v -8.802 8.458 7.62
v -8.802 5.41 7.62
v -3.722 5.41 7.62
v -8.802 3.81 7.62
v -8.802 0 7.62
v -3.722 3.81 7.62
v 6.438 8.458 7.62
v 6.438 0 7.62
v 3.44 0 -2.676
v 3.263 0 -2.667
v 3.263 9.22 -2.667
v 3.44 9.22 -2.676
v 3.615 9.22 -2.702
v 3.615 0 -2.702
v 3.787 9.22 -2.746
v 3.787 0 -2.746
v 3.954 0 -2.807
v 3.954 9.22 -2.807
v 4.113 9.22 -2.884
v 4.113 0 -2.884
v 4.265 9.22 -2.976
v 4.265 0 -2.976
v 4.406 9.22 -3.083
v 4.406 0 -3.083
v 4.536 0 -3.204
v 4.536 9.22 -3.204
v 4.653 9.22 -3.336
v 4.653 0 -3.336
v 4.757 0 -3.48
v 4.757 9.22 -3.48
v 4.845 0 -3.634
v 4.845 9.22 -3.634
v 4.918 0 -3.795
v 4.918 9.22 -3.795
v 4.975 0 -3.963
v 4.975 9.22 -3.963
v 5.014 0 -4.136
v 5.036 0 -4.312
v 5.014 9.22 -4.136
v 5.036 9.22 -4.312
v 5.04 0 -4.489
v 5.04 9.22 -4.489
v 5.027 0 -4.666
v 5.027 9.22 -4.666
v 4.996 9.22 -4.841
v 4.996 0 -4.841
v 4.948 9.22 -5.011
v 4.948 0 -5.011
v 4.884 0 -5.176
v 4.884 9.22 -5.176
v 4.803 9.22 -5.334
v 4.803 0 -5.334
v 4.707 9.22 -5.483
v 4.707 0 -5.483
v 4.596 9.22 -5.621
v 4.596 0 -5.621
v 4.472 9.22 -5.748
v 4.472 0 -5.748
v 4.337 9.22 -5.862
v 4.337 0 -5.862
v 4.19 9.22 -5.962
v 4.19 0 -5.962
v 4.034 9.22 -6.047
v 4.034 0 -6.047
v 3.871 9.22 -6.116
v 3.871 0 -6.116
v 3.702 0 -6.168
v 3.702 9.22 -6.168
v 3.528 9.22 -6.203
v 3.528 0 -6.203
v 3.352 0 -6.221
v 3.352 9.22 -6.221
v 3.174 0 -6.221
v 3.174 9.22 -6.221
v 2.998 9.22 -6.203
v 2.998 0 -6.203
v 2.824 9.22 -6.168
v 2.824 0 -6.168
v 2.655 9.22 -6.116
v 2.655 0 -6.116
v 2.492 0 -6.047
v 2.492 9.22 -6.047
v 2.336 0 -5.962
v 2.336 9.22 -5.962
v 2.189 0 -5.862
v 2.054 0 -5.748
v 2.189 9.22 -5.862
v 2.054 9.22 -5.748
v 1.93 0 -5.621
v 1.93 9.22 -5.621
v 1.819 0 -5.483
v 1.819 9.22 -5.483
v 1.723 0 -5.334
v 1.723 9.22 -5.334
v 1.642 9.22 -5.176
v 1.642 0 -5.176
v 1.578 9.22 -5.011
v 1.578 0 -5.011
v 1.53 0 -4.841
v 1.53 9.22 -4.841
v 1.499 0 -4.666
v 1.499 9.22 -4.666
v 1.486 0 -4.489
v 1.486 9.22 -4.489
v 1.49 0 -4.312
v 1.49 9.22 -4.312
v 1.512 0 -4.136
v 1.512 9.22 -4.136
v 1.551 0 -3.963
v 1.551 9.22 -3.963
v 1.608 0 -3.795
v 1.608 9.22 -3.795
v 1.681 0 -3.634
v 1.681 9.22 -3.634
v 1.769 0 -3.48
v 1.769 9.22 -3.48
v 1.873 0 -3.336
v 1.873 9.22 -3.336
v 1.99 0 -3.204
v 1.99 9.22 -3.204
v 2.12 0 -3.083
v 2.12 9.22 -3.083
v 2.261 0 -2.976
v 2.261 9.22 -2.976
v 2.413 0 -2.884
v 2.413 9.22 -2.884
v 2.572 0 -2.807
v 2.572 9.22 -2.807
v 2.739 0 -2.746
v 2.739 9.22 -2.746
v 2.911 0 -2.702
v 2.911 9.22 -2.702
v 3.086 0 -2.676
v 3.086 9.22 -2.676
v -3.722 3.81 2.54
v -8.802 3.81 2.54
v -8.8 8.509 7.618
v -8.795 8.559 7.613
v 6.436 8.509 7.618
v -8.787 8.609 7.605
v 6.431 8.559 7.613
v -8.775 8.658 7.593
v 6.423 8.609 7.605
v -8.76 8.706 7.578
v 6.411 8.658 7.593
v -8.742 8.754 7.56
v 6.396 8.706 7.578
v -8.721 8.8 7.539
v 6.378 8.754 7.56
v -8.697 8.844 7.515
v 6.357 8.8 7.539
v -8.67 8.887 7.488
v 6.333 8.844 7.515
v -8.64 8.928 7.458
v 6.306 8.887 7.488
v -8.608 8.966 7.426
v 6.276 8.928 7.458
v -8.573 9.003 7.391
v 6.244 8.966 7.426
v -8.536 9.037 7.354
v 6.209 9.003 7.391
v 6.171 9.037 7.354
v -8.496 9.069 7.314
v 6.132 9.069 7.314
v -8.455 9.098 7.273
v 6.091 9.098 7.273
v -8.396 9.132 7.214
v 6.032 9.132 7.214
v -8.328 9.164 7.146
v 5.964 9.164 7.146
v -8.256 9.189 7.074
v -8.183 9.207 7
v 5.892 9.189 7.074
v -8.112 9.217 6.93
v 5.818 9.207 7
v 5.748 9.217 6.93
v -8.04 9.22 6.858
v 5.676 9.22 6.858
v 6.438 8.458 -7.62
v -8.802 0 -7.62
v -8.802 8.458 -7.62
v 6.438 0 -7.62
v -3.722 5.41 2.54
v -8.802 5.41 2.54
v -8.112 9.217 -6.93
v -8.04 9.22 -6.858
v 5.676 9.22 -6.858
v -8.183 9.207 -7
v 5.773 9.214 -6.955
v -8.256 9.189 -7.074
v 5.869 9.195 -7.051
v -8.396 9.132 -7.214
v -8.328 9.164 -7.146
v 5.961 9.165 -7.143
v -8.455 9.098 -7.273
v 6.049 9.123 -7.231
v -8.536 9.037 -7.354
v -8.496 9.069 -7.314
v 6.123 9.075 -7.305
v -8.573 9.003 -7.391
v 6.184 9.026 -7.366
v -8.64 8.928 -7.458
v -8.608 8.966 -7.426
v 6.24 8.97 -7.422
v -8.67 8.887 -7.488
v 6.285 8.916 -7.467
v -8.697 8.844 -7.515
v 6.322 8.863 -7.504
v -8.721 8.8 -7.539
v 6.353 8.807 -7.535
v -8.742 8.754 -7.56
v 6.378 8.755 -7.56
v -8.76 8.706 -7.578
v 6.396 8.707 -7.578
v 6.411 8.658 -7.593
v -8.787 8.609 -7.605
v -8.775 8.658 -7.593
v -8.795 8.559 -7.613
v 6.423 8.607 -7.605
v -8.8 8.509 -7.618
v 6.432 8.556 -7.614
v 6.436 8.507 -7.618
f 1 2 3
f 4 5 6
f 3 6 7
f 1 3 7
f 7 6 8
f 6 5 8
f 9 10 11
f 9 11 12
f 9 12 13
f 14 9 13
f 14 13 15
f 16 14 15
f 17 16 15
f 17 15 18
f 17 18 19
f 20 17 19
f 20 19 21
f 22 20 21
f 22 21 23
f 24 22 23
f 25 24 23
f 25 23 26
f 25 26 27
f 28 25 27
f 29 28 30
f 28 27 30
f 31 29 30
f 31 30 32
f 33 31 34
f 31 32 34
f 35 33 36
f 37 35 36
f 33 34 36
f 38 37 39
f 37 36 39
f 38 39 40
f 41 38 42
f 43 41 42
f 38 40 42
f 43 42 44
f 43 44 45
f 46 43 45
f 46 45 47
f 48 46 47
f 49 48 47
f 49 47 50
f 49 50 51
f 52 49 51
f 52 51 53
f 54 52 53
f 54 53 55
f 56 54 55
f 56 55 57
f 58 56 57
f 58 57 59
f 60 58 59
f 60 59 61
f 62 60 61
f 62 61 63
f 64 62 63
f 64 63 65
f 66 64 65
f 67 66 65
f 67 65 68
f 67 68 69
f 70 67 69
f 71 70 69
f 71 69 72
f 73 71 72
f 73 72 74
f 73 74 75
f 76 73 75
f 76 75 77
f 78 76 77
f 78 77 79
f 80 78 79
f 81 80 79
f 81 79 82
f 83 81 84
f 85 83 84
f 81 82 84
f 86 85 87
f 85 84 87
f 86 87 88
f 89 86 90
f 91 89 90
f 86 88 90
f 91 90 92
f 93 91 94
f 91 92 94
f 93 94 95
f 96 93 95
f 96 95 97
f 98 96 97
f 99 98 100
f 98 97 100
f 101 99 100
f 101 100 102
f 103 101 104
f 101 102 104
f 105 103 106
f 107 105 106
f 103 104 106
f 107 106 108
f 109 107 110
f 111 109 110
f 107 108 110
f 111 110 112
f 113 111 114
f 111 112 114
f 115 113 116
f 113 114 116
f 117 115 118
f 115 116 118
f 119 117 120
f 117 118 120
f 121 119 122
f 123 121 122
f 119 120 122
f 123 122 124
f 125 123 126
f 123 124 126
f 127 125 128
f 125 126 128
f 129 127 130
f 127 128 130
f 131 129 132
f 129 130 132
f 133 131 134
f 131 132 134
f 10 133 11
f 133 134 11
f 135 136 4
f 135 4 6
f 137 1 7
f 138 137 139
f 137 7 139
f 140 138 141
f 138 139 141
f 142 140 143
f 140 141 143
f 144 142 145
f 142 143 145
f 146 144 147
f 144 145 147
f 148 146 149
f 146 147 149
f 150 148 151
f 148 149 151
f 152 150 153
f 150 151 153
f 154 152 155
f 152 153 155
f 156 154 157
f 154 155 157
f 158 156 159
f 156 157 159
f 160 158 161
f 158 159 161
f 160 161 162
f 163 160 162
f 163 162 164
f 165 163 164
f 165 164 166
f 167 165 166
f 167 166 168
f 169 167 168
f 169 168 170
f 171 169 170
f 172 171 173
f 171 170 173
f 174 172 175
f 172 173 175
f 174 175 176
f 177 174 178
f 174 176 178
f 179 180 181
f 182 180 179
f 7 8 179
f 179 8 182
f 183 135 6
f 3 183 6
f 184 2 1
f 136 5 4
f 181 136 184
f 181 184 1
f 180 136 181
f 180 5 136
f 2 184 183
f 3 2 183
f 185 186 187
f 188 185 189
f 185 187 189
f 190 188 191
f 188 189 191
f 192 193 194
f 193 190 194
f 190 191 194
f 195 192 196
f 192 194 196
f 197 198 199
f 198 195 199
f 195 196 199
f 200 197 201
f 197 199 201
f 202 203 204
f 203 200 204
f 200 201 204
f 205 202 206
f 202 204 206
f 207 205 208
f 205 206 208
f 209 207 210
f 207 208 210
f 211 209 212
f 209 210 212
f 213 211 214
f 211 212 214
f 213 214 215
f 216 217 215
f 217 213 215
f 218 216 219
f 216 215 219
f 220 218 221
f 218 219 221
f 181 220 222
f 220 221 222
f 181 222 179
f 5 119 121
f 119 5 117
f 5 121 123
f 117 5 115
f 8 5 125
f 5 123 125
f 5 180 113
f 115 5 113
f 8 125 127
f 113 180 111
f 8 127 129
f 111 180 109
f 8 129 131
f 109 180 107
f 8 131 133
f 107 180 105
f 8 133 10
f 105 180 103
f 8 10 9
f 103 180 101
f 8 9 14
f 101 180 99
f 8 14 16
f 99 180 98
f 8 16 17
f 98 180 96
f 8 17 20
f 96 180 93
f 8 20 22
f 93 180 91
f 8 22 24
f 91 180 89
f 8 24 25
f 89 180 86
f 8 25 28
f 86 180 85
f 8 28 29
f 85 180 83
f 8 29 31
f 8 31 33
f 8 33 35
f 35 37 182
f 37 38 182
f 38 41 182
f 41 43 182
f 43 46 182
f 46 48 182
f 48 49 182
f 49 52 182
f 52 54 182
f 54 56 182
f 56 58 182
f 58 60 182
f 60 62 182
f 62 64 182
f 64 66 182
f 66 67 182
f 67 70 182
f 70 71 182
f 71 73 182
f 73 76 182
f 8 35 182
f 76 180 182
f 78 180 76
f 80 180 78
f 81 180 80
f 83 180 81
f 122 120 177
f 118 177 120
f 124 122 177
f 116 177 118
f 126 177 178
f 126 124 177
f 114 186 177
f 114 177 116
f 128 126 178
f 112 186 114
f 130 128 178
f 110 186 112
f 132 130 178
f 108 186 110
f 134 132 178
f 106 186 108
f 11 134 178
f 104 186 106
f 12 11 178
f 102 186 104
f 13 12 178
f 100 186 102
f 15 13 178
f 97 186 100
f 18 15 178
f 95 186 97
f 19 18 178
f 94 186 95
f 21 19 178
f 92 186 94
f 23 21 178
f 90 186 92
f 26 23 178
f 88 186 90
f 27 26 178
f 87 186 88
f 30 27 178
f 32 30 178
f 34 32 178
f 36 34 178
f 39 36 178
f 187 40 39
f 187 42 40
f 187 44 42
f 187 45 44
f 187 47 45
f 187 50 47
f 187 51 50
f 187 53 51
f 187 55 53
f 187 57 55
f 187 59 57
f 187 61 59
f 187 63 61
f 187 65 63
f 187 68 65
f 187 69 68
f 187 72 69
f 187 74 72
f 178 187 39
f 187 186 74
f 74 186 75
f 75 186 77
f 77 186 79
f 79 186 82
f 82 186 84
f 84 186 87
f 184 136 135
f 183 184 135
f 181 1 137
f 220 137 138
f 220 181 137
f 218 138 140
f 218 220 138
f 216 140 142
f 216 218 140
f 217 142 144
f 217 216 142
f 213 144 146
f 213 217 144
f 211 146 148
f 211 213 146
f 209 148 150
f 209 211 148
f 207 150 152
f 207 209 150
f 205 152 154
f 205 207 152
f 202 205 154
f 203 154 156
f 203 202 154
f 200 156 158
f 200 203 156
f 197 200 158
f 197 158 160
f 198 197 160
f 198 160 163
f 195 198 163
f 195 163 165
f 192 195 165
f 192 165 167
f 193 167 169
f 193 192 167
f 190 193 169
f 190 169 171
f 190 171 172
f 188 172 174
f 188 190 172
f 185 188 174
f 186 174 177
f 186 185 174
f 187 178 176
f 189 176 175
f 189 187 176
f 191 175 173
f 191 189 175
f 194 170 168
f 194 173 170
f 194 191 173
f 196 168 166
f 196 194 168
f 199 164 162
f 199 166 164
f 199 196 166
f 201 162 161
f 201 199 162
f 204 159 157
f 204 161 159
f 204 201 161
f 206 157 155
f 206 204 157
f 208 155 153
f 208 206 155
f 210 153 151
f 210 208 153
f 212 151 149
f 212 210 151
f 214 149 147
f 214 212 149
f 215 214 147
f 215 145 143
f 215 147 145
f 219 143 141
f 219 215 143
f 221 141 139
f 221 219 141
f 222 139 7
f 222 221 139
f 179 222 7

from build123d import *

# Parameters (mm, degrees)
SKETCH1_W           = 15.24
SKETCH1_H           = 15.24
BOSS_EXTRUDE1_DEPTH = 3.81
BOSS_EXTRUDE2_DEPTH = 1.6002
SKETCH3_W           = 15.24
SKETCH3_H           = 15.24
BOSS_EXTRUDE3_DEPTH = 3.81
SKETCH4_R           = 1.778
CUT_EXTRUDE1_DEPTH  = 15.851000211
FILLET1_R           = 0.762


with BuildPart() as part:
    # Sketch1 → Boss-Extrude1 (new body)
    with BuildSketch(Plane(origin=(0, 0, 0), x_dir=(1, 0, 0), z_dir=(0, 1, 0))):
        with Locations((-1.182029268, 0)):
            Rectangle(SKETCH1_W, SKETCH1_H)
    extrude(amount=BOSS_EXTRUDE1_DEPTH)

    # Sketch2 → Boss-Extrude2 (add)
    with BuildSketch(Plane(origin=(0, 3.81, 0), x_dir=(1, 0, 0), z_dir=(0, 1, 0))):
        Polygon((-8.802029268, -2.54), (-3.722029268, -2.54), (-3.722029268, -7.62), (6.437970732, -7.62), (6.437970732, 7.62), (-8.802029268, 7.62), align=None)
    extrude(amount=BOSS_EXTRUDE2_DEPTH)

    # Sketch3 → Boss-Extrude3 (add)
    with BuildSketch(Plane(origin=(0, 5.4102, 0), x_dir=(1, 0, 0), z_dir=(0, 1, 0))):
        with Locations((-1.182029268, 0)):
            Rectangle(SKETCH3_W, SKETCH3_H)
    extrude(amount=BOSS_EXTRUDE3_DEPTH)

    # Sketch4 → Cut-Extrude1 (cut, through all)
    with BuildSketch(Plane(origin=(0, 9.2202, 0), x_dir=(1, 0, 0), z_dir=(0, 1, 0))):
        with Locations(Location((3.262970732, 4.445, 0), (0, 0, 270))):
            Circle(SKETCH4_R)
    extrude(amount=-CUT_EXTRUDE1_DEPTH, mode=Mode.SUBTRACT)

    # Fillet1
    fillet1_edges = [part.edges().sort_by_distance(p)[0] for p in [
        (-8.802029268, 9.2202, 0),
        (-1.182029268, 9.2202, 7.62),
        (6.437970732, 9.2202, 0),
        (-1.182029268, 9.2202, -7.62),
    ]]
    fillet(fillet1_edges, radius=FILLET1_R)


solid = part.part
